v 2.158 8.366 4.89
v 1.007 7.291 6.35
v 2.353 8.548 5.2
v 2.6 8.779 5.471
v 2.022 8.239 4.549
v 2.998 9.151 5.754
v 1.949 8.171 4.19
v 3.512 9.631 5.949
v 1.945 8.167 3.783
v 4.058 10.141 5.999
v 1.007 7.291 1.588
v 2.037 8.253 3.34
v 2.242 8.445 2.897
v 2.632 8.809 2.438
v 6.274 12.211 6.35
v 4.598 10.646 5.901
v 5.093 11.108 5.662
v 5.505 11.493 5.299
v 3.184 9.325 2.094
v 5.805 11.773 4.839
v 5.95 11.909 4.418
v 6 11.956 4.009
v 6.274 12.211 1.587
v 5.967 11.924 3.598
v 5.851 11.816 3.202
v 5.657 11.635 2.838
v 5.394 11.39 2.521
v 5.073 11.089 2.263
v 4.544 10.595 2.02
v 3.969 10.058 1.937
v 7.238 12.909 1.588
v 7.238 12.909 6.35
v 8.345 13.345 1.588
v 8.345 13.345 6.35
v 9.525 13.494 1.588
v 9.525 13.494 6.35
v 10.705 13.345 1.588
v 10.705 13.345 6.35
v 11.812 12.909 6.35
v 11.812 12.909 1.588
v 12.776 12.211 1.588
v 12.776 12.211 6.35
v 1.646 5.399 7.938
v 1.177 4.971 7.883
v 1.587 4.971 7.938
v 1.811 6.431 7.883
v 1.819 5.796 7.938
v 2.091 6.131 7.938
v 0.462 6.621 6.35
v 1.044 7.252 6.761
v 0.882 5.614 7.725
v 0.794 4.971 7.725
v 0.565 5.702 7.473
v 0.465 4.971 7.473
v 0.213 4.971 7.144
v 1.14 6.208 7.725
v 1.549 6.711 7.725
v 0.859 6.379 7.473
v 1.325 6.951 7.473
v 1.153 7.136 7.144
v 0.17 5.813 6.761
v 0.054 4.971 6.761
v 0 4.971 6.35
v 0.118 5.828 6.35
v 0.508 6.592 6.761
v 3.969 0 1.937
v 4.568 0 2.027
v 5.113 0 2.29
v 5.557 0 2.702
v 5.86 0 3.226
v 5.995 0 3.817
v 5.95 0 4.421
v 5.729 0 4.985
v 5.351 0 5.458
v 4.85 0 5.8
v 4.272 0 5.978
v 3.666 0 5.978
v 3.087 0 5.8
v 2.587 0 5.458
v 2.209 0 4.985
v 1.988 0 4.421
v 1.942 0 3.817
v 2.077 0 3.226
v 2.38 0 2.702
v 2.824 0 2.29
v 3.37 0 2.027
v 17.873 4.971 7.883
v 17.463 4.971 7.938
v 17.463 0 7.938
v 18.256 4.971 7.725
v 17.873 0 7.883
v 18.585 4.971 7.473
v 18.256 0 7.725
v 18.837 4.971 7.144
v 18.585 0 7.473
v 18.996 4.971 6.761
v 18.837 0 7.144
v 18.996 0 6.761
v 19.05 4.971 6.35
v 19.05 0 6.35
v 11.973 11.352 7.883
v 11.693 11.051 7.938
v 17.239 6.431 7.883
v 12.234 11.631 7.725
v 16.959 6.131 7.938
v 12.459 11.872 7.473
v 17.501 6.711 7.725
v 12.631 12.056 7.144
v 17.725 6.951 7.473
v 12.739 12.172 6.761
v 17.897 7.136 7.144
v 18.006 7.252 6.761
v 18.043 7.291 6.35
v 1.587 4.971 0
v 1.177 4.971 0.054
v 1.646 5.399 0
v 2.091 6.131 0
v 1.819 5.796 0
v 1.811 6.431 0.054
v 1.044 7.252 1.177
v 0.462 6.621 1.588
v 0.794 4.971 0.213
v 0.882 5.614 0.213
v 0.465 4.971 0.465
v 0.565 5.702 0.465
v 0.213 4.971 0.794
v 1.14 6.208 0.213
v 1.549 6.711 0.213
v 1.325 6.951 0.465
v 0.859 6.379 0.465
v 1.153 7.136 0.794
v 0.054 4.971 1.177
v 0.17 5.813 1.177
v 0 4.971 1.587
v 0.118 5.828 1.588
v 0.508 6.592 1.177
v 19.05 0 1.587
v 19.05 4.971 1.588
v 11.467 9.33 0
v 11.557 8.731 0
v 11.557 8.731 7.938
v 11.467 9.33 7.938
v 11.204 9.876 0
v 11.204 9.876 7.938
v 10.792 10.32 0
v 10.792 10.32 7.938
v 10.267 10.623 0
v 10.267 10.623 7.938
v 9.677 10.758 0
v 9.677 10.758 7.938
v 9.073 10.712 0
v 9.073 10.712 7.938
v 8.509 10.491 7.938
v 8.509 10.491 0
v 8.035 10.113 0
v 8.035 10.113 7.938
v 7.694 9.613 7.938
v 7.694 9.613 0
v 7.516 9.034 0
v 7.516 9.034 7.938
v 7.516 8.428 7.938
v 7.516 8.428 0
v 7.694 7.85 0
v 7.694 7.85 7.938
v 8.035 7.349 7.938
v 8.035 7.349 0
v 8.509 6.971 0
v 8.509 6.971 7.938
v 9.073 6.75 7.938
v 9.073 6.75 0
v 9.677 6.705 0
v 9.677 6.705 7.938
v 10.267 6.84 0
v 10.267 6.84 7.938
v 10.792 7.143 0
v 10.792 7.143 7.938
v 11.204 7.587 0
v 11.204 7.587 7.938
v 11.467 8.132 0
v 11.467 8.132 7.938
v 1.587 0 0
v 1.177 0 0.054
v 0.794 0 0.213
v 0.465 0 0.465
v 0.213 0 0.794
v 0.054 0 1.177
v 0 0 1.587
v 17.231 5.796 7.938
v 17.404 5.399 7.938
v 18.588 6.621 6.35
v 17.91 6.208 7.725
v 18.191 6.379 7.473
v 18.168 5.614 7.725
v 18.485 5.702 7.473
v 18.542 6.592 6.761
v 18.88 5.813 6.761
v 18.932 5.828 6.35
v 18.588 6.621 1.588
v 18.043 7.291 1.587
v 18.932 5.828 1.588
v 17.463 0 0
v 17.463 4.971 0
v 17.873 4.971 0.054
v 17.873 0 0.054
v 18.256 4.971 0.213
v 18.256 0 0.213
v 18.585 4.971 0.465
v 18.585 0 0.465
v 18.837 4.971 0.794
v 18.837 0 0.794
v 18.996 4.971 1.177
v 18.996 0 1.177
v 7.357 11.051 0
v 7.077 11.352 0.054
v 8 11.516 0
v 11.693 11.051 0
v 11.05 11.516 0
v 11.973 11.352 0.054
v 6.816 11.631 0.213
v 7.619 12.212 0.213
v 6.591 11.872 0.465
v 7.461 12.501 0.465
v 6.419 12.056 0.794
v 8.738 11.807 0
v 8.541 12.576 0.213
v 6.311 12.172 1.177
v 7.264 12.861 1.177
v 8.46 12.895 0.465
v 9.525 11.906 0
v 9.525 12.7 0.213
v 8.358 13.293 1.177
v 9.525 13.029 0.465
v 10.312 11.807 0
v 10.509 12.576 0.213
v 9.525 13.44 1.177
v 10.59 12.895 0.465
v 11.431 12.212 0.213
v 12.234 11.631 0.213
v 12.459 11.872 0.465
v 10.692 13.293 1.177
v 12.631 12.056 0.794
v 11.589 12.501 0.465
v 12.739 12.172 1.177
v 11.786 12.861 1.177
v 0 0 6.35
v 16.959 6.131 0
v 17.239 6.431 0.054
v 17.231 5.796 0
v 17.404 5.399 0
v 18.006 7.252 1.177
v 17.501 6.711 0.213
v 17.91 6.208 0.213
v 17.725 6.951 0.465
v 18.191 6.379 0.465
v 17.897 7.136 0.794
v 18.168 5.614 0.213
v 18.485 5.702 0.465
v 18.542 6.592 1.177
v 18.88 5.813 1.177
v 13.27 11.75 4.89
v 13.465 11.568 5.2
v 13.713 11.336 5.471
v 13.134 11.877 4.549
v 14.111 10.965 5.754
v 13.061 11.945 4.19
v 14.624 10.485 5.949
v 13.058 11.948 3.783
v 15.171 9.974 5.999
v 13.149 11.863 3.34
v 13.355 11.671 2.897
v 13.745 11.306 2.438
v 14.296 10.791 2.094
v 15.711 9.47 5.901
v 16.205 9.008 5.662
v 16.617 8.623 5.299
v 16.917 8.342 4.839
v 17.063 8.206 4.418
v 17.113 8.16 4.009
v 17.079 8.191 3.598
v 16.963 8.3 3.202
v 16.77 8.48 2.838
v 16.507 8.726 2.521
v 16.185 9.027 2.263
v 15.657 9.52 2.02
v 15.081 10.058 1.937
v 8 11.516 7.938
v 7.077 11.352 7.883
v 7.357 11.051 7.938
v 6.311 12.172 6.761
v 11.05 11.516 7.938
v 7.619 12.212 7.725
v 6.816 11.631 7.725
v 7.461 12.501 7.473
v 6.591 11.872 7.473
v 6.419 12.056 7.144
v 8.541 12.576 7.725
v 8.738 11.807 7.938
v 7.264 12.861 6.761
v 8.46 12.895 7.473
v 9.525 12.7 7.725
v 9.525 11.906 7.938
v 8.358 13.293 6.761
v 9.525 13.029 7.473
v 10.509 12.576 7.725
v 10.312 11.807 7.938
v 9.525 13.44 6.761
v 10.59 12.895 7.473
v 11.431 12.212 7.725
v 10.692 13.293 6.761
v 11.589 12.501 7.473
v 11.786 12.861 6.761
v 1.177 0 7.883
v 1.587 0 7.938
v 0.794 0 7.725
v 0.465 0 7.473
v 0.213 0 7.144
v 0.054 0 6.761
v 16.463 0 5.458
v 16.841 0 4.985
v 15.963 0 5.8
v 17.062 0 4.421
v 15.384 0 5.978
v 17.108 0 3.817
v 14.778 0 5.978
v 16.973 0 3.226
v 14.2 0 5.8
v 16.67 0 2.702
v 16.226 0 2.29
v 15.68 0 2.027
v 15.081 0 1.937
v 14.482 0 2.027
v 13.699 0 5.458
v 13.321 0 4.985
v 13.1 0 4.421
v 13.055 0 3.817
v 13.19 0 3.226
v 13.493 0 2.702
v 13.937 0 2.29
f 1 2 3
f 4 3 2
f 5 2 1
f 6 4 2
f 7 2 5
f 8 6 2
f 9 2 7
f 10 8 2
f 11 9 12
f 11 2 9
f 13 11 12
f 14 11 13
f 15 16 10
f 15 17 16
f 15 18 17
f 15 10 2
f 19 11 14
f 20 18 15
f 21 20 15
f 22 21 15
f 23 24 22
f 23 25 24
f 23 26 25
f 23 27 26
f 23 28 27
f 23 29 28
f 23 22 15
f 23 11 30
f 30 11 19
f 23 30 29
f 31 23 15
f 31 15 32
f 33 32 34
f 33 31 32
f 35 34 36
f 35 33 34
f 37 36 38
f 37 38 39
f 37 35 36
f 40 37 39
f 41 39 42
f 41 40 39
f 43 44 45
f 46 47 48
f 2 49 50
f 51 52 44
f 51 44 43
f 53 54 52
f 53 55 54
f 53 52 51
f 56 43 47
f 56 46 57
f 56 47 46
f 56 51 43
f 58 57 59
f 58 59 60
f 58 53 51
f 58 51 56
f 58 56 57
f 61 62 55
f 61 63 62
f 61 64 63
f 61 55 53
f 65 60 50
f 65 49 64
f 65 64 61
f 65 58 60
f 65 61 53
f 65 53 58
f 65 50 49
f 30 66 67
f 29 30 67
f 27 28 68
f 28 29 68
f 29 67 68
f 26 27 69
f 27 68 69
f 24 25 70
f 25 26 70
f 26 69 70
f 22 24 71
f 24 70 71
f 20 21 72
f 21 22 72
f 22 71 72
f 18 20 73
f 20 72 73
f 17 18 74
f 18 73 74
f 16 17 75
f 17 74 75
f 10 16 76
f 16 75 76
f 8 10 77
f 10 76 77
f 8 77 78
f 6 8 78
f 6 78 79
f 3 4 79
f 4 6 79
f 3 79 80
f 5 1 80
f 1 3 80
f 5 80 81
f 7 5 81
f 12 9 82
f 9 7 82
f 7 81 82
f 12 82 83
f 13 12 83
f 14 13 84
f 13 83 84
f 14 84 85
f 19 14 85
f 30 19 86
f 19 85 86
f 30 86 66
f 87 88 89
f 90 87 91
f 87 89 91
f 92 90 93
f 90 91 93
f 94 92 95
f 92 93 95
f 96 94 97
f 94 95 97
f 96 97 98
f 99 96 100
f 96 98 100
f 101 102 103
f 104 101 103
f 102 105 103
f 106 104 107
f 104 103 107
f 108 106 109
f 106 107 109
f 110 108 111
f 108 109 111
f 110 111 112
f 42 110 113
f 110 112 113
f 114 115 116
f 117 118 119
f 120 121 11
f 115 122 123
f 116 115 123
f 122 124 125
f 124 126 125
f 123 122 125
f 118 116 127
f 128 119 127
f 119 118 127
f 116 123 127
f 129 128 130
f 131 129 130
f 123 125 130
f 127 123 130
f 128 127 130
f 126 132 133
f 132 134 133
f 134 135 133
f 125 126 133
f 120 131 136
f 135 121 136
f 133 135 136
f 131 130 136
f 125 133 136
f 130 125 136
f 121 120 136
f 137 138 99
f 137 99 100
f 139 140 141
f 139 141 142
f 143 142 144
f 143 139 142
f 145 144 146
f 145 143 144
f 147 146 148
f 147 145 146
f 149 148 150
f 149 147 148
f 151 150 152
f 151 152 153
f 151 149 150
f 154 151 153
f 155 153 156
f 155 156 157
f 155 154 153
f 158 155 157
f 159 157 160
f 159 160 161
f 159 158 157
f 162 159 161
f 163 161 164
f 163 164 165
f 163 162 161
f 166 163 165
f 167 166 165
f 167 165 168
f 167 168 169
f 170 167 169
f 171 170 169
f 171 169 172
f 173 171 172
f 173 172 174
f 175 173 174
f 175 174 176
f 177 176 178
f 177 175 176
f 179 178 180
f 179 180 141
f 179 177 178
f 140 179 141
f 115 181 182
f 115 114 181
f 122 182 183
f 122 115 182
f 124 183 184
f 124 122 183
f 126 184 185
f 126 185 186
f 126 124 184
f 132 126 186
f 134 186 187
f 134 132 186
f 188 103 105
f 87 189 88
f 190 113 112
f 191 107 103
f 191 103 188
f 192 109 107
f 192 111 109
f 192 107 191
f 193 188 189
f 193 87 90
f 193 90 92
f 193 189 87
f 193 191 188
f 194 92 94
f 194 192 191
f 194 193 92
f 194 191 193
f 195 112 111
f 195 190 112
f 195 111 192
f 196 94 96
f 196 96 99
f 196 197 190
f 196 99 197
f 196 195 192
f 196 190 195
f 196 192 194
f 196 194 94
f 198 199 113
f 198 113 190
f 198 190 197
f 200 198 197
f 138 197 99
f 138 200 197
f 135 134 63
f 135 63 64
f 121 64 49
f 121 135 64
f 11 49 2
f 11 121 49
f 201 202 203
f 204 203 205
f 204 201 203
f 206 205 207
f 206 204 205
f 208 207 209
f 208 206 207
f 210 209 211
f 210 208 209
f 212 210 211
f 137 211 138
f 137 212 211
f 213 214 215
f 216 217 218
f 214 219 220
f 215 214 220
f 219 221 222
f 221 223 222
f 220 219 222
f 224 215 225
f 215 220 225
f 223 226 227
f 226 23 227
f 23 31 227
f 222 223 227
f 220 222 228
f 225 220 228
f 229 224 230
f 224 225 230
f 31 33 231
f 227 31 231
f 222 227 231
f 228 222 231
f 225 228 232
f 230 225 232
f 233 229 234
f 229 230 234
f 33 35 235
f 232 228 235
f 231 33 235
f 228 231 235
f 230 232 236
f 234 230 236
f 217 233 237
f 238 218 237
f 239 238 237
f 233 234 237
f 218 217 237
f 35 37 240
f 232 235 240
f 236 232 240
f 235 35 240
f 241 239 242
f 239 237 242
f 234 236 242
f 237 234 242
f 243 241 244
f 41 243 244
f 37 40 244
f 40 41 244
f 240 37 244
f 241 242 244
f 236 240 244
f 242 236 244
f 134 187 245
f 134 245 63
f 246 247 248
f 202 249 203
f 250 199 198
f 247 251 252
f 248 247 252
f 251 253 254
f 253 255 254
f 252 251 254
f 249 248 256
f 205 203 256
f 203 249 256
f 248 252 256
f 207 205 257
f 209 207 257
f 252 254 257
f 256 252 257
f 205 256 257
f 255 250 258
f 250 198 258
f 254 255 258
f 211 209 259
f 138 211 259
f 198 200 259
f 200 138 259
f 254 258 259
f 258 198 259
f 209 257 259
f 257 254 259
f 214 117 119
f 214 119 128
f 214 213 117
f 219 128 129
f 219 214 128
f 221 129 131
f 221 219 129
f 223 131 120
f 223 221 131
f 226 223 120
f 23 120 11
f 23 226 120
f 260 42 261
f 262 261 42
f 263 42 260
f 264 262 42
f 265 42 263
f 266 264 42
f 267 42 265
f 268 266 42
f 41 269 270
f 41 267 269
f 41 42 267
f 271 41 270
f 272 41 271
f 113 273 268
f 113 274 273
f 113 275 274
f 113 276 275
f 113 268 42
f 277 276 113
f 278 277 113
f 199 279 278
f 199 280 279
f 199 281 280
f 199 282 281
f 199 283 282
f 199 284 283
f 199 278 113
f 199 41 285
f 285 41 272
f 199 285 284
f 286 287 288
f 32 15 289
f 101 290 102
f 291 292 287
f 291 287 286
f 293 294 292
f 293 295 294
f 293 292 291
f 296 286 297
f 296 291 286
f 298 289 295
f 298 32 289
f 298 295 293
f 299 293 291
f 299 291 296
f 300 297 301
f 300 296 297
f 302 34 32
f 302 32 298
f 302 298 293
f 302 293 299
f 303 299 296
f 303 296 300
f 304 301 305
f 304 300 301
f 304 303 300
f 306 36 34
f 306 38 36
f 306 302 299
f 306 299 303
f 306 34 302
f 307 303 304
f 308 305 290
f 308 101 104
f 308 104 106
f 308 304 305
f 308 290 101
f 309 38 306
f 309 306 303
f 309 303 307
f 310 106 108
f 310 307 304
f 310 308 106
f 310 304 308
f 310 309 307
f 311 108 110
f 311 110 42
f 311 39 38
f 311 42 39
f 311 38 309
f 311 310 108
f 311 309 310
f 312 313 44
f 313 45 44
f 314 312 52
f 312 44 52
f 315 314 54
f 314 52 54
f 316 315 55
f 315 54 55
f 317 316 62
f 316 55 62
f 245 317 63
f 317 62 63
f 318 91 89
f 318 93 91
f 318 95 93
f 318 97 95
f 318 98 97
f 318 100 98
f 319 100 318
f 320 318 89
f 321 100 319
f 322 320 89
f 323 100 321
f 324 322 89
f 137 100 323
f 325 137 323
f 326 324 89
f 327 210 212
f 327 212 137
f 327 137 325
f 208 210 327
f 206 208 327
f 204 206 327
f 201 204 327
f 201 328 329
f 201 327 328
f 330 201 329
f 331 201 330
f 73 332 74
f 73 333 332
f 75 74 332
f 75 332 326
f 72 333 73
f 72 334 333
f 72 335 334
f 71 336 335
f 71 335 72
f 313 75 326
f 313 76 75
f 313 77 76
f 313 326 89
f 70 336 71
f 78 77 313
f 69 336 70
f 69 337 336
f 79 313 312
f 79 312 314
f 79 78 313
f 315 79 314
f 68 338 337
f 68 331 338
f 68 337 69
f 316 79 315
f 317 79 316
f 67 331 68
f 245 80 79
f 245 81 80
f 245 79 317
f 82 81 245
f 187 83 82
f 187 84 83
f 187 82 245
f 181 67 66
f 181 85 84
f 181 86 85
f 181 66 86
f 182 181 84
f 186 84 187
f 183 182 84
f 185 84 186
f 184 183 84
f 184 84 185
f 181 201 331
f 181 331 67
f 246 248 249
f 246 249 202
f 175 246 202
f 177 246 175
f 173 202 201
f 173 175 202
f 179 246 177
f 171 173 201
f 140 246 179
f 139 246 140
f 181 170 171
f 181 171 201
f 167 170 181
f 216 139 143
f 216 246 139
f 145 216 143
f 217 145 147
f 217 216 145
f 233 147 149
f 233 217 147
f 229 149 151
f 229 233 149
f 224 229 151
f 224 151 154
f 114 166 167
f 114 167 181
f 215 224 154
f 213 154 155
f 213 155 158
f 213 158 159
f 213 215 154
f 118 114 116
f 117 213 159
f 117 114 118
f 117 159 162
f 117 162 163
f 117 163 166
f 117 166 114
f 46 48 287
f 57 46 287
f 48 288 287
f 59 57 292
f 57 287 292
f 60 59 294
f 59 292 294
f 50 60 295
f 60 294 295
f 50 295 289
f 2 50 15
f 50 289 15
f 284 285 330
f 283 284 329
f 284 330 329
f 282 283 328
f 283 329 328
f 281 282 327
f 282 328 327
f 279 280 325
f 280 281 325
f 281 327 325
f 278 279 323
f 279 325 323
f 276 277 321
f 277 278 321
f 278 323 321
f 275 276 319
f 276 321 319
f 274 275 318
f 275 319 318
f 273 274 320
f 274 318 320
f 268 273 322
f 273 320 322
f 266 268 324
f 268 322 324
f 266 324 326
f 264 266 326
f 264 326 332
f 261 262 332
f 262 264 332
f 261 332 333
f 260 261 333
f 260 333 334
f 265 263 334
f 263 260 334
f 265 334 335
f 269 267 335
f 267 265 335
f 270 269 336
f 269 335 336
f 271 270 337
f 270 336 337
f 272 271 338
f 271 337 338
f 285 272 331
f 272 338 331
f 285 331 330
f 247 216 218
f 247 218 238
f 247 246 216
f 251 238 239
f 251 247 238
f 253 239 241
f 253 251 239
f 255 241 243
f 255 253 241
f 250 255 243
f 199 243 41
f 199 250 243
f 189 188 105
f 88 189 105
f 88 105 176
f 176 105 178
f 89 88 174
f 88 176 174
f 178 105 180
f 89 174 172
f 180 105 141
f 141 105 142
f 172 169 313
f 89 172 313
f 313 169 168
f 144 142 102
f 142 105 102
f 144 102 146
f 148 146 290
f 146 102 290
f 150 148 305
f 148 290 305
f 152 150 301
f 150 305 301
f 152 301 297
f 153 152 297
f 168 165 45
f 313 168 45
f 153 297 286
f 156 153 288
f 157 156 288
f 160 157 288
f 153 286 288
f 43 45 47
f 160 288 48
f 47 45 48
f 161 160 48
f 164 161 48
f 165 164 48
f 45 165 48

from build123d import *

# Parameters (mm, degrees)
SKETCH1_R           = 2.032
BOSS_EXTRUDE1_DEPTH = 7.9375
SKETCH2_R           = 2.032
CUT_EXTRUDE1_DEPTH  = 25.6574065
FILLET1_R           = 1.5875


with BuildPart() as part:
    # Sketch1 → Boss-Extrude1 (new body)
    with BuildSketch(Plane.XY):
        with BuildLine():
            Line((0, 0), (0, 4.971229117))
            ThreePointArc((0, 4.971229117), (0.262744783, 6.235900833), (1.007492629, 7.291258599))
            Line((1.007492629, 7.291258599), (6.273738944, 12.211294223))
            ThreePointArc((6.273738944, 12.211294223), (9.525, 13.49375), (12.776261056, 12.211294223))
            Line((12.776261056, 12.211294223), (18.042507371, 7.291258599))
            ThreePointArc((18.042507371, 7.291258599), (18.787255217, 6.235900833), (19.05, 4.971229117))
            Line((19.05, 4.971229117), (19.05, 0))
            Line((19.05, 0), (0, 0))
        make_face()
        with Locations((9.525, 8.73125)):
            Circle(SKETCH1_R, mode=Mode.SUBTRACT)
    extrude(amount=BOSS_EXTRUDE1_DEPTH)

    # Sketch2 → Cut-Extrude1 (cut, through all)
    with BuildSketch(Plane.XZ):
        with Locations(Location((3.96875, 3.96875, 0), (0, 0, 270))):
            Circle(SKETCH2_R)
        with Locations(Location((15.08125, 3.96875, 0), (0, 0, 270))):
            Circle(SKETCH2_R)
    extrude(amount=-CUT_EXTRUDE1_DEPTH, mode=Mode.SUBTRACT)

    # Fillet1
    fillet1_edges = [part.edges().sort_by_distance(p)[0] for p in [
        (15.409384213, 9.751276411, 0),
        (18.787255217, 6.235900833, 0),
        (19.05, 2.485614558, 0),
        (18.787255217, 6.235900833, 7.9375),
        (15.409384213, 9.751276411, 7.9375),
        (9.525, 13.49375, 7.9375),
        (3.640615787, 9.751276411, 7.9375),
        (0.262744783, 6.235900833, 7.9375),
        (0, 2.485614558, 7.9375),
        (0, 2.485614558, 0),
        (19.05, 2.485614558, 7.9375),
        (0.262744783, 6.235900833, 0),
        (3.640615787, 9.751276411, 0),
        (9.525, 13.49375, 0),
    ]]
    fillet(fillet1_edges, radius=FILLET1_R)


solid = part.part
